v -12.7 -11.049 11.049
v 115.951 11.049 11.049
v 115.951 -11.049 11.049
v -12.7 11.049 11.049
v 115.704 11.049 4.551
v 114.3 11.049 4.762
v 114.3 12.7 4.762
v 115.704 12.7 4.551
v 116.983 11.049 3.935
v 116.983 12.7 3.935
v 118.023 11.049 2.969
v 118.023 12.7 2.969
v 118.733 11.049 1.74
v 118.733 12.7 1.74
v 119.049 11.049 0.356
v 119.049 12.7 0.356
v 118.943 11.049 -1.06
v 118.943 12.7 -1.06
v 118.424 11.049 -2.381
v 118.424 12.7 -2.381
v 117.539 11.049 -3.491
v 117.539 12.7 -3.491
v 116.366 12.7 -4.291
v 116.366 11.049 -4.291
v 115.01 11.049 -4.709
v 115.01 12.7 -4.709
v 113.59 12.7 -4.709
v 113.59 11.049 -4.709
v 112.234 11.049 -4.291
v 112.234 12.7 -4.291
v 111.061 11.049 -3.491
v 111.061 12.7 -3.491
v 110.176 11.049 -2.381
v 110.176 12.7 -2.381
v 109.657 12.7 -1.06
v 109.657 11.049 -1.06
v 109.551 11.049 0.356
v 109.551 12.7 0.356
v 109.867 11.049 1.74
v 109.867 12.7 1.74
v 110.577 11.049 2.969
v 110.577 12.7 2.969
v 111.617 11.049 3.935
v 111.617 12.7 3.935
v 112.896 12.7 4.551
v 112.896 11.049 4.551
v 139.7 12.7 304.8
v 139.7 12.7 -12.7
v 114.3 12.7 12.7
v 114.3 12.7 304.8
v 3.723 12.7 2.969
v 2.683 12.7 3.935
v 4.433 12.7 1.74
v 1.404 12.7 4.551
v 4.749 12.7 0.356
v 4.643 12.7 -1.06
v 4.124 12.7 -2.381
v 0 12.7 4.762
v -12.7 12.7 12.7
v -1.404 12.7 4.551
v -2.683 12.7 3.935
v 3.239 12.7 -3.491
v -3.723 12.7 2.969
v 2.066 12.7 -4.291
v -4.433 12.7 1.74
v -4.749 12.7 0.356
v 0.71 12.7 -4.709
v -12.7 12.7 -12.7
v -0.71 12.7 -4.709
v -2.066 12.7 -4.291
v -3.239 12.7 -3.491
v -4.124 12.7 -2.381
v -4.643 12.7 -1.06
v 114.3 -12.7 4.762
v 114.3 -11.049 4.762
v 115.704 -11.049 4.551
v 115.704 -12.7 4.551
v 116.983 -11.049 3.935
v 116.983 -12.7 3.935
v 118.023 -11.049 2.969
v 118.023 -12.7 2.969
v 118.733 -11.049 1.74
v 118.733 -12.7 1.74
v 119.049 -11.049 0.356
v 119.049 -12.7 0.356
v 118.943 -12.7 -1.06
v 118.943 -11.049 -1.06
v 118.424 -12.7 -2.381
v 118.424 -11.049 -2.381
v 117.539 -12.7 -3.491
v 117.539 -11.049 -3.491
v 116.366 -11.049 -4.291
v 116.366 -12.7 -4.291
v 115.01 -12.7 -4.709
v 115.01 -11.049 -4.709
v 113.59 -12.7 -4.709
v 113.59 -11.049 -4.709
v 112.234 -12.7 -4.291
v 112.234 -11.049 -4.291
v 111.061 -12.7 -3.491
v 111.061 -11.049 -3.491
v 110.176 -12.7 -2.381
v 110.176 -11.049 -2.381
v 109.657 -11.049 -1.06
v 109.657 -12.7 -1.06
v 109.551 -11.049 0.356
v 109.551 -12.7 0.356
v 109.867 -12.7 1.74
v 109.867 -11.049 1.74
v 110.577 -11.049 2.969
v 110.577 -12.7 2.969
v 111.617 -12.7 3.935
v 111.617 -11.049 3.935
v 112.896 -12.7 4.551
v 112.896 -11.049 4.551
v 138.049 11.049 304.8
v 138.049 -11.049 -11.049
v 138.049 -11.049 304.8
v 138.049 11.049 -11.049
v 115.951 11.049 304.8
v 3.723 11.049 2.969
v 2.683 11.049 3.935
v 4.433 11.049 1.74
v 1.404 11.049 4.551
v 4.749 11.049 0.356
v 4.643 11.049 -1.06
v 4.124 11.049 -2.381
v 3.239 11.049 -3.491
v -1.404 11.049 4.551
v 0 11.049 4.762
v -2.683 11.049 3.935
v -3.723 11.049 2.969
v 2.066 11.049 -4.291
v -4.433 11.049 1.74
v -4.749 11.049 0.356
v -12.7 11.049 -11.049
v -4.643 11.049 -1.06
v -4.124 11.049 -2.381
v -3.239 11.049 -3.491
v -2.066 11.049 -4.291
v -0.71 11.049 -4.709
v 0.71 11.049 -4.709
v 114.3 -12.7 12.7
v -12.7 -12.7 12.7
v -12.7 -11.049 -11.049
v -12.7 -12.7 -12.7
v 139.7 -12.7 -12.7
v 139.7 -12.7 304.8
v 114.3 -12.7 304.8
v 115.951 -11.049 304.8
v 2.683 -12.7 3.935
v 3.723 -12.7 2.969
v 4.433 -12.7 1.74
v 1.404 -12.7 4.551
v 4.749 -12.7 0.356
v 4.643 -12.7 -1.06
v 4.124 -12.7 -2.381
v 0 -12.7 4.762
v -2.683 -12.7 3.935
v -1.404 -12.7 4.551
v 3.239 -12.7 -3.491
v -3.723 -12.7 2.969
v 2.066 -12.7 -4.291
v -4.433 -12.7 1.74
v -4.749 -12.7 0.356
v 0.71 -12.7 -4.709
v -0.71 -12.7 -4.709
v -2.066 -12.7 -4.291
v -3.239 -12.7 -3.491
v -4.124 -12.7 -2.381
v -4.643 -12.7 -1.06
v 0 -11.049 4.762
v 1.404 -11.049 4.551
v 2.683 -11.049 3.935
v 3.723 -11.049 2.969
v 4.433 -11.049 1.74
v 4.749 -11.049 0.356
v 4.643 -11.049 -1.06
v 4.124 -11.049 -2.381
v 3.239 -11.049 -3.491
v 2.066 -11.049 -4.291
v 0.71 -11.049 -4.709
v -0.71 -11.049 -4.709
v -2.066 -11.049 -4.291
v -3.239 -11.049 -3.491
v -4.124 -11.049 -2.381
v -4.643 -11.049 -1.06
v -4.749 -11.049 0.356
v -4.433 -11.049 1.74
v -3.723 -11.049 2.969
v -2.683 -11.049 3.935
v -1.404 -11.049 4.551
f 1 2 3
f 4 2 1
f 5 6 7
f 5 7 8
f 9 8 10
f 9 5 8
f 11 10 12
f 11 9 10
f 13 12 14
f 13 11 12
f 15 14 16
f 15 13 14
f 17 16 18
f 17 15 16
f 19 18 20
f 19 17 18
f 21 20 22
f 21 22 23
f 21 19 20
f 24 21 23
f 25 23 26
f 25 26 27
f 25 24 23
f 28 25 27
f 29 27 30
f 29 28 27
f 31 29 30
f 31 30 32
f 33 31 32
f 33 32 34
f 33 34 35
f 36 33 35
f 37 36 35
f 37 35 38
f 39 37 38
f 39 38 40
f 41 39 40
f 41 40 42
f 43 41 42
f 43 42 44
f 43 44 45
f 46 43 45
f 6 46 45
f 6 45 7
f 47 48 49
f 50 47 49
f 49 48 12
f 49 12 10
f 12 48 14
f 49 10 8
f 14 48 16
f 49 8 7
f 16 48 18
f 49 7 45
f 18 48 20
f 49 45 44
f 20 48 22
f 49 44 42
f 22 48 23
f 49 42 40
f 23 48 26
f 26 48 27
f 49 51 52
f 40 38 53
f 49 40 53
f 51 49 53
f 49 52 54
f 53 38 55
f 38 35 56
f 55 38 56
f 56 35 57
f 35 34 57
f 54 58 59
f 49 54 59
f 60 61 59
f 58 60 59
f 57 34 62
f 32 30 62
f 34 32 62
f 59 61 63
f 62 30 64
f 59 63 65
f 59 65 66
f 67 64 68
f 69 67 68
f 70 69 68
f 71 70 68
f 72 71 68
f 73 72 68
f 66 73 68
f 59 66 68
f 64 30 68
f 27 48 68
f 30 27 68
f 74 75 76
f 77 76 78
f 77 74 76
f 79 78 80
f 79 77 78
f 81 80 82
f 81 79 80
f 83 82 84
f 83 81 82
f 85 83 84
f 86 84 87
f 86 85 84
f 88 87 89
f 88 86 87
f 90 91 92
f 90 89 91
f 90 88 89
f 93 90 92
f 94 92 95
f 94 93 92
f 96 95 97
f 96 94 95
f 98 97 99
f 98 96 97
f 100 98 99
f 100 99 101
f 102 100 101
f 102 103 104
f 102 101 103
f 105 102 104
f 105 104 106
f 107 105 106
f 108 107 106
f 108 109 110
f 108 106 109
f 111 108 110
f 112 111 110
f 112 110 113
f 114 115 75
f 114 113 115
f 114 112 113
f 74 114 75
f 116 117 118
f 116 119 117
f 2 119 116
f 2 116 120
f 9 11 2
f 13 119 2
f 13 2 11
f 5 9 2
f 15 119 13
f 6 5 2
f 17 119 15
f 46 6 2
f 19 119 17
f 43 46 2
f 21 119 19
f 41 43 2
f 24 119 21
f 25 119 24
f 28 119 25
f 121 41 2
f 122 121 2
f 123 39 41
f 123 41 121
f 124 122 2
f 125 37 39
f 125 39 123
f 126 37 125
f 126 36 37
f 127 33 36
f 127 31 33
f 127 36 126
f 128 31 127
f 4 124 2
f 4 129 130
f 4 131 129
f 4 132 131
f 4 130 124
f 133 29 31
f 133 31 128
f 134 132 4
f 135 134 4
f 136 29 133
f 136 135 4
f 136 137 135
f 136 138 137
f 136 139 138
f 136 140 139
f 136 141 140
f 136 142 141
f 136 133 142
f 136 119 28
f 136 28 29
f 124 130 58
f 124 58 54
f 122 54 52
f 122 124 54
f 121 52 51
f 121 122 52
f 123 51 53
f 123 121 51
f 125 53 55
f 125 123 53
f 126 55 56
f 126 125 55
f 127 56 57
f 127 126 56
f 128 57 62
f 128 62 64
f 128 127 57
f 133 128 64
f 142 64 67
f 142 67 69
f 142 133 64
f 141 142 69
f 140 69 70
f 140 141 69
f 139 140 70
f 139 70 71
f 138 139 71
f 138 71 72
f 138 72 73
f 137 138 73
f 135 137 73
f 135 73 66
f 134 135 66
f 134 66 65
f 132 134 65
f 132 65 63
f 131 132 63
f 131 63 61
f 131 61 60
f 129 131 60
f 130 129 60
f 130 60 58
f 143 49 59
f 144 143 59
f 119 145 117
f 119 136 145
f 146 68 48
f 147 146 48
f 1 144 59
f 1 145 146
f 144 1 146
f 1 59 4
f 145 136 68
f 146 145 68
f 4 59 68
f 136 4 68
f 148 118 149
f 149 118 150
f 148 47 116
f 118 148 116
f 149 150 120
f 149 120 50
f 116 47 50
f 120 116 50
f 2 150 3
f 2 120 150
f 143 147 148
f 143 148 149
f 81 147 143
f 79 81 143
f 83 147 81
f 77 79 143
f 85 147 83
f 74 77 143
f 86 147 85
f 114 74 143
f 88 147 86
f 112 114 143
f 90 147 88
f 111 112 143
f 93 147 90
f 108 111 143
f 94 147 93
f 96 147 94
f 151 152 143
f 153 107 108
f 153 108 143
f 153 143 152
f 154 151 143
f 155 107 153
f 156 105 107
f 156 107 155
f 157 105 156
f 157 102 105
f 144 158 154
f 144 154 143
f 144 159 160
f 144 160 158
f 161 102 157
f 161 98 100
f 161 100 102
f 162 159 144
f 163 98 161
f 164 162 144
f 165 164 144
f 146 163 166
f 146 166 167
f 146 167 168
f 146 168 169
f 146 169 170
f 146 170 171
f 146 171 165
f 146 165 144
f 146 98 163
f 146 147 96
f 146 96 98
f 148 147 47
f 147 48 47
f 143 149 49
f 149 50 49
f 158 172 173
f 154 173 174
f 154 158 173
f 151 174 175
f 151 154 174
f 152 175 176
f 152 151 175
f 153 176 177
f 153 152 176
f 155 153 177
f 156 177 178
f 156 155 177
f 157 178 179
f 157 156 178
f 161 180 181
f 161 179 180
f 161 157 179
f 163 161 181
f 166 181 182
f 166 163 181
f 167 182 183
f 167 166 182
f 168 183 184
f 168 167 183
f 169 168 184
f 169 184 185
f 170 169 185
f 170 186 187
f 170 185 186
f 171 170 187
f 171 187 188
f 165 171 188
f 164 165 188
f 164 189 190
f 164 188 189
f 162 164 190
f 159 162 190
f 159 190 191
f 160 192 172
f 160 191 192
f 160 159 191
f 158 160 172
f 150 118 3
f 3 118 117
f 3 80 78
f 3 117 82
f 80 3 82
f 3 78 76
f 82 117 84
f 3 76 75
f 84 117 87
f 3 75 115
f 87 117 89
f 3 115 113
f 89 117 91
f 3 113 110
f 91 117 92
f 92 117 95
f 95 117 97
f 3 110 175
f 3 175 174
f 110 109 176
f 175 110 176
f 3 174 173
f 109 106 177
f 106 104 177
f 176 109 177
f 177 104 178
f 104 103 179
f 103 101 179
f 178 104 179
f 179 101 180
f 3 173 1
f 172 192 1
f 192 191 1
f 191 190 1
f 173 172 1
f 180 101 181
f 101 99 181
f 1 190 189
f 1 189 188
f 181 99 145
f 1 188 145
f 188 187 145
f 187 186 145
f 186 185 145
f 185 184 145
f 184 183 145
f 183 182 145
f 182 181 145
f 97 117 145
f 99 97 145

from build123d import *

# Parameters (mm, degrees)
SKETCH1_R           = 4.7625
BOSS_EXTRUDE1_DEPTH = 12.7
SHELL1_T            = -1.651


with BuildPart() as part:
    # Sketch1 → Boss-Extrude1 (new, symmetric)
    with BuildSketch(Plane(origin=(0, 0, 0), x_dir=(1, 0, 0), z_dir=(0, 1, 0))):
        Polygon((-12.7, 12.7), (139.7, 12.7), (139.7, -304.8), (114.3, -304.8), (114.3, -12.7), (-12.7, -12.7), align=None)
        with Locations(Location((0, 0, 0), (0, 0, 270))):
            Circle(SKETCH1_R, mode=Mode.SUBTRACT)
        with Locations(Location((114.3, 0, 0), (0, 0, 270))):
            Circle(SKETCH1_R, mode=Mode.SUBTRACT)
    extrude(amount=BOSS_EXTRUDE1_DEPTH, both=True)

    # Shell1
    shell1_openings = [part.faces().sort_by_distance(p)[0] for p in [
        (127, 0, 304.8),
        (-12.7, 0, 0),
        (0, 0, -4.7625),
        (114.3, 0, -4.7625),
    ]]
    offset(amount=SHELL1_T, openings=shell1_openings, kind=Kind.INTERSECTION)


solid = part.part
